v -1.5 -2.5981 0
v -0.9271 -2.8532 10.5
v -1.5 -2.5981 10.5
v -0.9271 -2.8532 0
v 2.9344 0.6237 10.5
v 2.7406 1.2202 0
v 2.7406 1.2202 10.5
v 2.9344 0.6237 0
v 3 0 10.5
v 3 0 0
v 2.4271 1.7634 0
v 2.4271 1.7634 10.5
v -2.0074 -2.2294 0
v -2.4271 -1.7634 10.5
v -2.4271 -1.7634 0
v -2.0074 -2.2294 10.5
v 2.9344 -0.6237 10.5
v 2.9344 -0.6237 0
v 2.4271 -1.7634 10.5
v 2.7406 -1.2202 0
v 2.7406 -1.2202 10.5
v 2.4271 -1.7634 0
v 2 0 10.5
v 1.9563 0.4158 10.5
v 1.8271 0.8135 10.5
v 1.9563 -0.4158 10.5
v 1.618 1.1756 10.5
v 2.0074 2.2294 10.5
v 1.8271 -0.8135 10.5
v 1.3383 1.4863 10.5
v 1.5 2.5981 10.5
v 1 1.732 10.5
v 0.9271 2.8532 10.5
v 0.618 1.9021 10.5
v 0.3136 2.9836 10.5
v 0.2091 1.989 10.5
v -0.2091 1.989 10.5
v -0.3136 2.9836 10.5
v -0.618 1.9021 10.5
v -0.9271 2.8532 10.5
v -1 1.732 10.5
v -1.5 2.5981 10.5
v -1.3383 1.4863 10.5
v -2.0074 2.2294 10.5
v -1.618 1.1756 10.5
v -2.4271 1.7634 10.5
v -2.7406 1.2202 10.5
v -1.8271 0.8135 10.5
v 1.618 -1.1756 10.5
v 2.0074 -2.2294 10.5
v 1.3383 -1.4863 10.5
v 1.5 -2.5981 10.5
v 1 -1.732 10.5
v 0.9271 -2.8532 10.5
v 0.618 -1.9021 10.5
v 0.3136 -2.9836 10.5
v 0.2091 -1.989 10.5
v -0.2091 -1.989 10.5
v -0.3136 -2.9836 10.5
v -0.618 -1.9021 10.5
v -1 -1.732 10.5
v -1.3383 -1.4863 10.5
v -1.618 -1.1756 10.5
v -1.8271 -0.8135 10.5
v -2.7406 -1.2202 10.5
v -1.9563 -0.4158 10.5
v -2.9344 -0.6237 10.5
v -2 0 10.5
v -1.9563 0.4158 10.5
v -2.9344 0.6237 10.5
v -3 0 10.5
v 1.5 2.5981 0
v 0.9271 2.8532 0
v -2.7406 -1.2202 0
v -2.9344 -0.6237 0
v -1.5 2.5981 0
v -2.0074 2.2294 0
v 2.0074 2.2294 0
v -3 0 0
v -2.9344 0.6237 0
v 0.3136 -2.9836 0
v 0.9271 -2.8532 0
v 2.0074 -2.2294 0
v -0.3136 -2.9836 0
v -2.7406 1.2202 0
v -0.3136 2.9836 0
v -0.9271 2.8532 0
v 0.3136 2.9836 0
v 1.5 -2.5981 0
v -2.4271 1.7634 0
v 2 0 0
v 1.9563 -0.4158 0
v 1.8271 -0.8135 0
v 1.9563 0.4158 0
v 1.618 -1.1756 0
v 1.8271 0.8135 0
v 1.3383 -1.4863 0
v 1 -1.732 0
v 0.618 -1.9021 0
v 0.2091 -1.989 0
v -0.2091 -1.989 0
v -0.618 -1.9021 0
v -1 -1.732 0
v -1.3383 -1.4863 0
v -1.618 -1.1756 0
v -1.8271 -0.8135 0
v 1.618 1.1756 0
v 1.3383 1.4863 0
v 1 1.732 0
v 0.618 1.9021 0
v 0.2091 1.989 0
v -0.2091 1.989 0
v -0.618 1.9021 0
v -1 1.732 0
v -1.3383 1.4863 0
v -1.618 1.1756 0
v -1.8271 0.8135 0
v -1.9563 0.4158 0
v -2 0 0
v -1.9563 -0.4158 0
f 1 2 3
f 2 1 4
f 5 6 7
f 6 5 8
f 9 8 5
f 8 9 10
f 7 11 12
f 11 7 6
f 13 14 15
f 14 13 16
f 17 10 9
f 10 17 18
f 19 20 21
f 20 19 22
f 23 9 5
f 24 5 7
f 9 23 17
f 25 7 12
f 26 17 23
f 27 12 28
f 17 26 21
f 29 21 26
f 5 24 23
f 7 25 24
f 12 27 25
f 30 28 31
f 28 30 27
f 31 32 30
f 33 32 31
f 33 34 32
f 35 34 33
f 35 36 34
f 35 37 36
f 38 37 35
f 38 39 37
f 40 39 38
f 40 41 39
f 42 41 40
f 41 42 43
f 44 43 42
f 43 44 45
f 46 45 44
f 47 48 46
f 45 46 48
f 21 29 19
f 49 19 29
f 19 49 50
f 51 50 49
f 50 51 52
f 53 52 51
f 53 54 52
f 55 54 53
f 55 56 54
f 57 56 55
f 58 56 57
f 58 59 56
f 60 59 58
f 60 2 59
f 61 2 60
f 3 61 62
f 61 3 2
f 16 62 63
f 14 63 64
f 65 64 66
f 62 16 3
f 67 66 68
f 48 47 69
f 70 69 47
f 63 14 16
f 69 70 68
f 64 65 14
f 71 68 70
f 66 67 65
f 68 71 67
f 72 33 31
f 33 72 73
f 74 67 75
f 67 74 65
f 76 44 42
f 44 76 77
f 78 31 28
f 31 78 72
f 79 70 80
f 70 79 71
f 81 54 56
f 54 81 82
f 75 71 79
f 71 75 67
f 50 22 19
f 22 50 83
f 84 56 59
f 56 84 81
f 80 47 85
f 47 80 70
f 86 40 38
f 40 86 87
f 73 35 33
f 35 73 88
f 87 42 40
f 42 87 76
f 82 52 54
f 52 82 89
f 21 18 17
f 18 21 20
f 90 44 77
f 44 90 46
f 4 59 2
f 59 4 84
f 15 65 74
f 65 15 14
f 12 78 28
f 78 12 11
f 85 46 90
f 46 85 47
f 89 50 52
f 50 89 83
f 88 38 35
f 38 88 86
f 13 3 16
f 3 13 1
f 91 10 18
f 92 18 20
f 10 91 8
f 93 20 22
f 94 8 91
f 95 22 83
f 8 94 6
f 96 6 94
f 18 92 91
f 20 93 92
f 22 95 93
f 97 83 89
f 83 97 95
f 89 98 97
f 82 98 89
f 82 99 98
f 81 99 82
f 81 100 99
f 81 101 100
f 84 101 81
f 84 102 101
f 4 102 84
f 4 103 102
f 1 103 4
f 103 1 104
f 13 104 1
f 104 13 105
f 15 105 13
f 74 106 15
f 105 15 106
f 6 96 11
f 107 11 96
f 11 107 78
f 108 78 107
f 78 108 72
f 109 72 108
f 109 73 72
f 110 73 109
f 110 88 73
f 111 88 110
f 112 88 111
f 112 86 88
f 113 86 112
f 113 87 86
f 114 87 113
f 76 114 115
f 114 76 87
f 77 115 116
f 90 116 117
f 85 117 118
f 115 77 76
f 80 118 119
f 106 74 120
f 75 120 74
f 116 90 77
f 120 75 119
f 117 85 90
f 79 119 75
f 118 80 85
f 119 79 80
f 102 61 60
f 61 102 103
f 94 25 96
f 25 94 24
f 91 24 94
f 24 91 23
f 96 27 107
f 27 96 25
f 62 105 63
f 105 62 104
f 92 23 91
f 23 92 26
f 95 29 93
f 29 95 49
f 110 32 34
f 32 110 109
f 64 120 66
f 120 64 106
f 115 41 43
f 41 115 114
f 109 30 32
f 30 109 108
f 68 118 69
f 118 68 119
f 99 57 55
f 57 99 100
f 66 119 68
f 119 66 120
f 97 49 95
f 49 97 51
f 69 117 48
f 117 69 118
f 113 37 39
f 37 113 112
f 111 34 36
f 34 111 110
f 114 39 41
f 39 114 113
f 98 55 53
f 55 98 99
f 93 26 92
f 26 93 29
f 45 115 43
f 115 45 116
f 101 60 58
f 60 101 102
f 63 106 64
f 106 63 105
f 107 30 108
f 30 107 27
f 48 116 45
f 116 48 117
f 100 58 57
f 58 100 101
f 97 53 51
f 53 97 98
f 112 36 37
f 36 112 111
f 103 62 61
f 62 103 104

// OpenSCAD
/// Pipe module


///< example
translate()pipe( 3, 2,  10.5 );
$fn = 30;

///< Def
module pipe( outer, inner, height ){
     offset_percent = 0.25;
     inner_h = height + (offset_percent * 2 );
     difference(){
     ///< Debug with union(){
	  cylinder(r=outer, h = height );
	  translate([0,0,-offset_percent]){
	       color("green",0.5)cylinder(r=inner, h = inner_h );
	       }
     }
}
